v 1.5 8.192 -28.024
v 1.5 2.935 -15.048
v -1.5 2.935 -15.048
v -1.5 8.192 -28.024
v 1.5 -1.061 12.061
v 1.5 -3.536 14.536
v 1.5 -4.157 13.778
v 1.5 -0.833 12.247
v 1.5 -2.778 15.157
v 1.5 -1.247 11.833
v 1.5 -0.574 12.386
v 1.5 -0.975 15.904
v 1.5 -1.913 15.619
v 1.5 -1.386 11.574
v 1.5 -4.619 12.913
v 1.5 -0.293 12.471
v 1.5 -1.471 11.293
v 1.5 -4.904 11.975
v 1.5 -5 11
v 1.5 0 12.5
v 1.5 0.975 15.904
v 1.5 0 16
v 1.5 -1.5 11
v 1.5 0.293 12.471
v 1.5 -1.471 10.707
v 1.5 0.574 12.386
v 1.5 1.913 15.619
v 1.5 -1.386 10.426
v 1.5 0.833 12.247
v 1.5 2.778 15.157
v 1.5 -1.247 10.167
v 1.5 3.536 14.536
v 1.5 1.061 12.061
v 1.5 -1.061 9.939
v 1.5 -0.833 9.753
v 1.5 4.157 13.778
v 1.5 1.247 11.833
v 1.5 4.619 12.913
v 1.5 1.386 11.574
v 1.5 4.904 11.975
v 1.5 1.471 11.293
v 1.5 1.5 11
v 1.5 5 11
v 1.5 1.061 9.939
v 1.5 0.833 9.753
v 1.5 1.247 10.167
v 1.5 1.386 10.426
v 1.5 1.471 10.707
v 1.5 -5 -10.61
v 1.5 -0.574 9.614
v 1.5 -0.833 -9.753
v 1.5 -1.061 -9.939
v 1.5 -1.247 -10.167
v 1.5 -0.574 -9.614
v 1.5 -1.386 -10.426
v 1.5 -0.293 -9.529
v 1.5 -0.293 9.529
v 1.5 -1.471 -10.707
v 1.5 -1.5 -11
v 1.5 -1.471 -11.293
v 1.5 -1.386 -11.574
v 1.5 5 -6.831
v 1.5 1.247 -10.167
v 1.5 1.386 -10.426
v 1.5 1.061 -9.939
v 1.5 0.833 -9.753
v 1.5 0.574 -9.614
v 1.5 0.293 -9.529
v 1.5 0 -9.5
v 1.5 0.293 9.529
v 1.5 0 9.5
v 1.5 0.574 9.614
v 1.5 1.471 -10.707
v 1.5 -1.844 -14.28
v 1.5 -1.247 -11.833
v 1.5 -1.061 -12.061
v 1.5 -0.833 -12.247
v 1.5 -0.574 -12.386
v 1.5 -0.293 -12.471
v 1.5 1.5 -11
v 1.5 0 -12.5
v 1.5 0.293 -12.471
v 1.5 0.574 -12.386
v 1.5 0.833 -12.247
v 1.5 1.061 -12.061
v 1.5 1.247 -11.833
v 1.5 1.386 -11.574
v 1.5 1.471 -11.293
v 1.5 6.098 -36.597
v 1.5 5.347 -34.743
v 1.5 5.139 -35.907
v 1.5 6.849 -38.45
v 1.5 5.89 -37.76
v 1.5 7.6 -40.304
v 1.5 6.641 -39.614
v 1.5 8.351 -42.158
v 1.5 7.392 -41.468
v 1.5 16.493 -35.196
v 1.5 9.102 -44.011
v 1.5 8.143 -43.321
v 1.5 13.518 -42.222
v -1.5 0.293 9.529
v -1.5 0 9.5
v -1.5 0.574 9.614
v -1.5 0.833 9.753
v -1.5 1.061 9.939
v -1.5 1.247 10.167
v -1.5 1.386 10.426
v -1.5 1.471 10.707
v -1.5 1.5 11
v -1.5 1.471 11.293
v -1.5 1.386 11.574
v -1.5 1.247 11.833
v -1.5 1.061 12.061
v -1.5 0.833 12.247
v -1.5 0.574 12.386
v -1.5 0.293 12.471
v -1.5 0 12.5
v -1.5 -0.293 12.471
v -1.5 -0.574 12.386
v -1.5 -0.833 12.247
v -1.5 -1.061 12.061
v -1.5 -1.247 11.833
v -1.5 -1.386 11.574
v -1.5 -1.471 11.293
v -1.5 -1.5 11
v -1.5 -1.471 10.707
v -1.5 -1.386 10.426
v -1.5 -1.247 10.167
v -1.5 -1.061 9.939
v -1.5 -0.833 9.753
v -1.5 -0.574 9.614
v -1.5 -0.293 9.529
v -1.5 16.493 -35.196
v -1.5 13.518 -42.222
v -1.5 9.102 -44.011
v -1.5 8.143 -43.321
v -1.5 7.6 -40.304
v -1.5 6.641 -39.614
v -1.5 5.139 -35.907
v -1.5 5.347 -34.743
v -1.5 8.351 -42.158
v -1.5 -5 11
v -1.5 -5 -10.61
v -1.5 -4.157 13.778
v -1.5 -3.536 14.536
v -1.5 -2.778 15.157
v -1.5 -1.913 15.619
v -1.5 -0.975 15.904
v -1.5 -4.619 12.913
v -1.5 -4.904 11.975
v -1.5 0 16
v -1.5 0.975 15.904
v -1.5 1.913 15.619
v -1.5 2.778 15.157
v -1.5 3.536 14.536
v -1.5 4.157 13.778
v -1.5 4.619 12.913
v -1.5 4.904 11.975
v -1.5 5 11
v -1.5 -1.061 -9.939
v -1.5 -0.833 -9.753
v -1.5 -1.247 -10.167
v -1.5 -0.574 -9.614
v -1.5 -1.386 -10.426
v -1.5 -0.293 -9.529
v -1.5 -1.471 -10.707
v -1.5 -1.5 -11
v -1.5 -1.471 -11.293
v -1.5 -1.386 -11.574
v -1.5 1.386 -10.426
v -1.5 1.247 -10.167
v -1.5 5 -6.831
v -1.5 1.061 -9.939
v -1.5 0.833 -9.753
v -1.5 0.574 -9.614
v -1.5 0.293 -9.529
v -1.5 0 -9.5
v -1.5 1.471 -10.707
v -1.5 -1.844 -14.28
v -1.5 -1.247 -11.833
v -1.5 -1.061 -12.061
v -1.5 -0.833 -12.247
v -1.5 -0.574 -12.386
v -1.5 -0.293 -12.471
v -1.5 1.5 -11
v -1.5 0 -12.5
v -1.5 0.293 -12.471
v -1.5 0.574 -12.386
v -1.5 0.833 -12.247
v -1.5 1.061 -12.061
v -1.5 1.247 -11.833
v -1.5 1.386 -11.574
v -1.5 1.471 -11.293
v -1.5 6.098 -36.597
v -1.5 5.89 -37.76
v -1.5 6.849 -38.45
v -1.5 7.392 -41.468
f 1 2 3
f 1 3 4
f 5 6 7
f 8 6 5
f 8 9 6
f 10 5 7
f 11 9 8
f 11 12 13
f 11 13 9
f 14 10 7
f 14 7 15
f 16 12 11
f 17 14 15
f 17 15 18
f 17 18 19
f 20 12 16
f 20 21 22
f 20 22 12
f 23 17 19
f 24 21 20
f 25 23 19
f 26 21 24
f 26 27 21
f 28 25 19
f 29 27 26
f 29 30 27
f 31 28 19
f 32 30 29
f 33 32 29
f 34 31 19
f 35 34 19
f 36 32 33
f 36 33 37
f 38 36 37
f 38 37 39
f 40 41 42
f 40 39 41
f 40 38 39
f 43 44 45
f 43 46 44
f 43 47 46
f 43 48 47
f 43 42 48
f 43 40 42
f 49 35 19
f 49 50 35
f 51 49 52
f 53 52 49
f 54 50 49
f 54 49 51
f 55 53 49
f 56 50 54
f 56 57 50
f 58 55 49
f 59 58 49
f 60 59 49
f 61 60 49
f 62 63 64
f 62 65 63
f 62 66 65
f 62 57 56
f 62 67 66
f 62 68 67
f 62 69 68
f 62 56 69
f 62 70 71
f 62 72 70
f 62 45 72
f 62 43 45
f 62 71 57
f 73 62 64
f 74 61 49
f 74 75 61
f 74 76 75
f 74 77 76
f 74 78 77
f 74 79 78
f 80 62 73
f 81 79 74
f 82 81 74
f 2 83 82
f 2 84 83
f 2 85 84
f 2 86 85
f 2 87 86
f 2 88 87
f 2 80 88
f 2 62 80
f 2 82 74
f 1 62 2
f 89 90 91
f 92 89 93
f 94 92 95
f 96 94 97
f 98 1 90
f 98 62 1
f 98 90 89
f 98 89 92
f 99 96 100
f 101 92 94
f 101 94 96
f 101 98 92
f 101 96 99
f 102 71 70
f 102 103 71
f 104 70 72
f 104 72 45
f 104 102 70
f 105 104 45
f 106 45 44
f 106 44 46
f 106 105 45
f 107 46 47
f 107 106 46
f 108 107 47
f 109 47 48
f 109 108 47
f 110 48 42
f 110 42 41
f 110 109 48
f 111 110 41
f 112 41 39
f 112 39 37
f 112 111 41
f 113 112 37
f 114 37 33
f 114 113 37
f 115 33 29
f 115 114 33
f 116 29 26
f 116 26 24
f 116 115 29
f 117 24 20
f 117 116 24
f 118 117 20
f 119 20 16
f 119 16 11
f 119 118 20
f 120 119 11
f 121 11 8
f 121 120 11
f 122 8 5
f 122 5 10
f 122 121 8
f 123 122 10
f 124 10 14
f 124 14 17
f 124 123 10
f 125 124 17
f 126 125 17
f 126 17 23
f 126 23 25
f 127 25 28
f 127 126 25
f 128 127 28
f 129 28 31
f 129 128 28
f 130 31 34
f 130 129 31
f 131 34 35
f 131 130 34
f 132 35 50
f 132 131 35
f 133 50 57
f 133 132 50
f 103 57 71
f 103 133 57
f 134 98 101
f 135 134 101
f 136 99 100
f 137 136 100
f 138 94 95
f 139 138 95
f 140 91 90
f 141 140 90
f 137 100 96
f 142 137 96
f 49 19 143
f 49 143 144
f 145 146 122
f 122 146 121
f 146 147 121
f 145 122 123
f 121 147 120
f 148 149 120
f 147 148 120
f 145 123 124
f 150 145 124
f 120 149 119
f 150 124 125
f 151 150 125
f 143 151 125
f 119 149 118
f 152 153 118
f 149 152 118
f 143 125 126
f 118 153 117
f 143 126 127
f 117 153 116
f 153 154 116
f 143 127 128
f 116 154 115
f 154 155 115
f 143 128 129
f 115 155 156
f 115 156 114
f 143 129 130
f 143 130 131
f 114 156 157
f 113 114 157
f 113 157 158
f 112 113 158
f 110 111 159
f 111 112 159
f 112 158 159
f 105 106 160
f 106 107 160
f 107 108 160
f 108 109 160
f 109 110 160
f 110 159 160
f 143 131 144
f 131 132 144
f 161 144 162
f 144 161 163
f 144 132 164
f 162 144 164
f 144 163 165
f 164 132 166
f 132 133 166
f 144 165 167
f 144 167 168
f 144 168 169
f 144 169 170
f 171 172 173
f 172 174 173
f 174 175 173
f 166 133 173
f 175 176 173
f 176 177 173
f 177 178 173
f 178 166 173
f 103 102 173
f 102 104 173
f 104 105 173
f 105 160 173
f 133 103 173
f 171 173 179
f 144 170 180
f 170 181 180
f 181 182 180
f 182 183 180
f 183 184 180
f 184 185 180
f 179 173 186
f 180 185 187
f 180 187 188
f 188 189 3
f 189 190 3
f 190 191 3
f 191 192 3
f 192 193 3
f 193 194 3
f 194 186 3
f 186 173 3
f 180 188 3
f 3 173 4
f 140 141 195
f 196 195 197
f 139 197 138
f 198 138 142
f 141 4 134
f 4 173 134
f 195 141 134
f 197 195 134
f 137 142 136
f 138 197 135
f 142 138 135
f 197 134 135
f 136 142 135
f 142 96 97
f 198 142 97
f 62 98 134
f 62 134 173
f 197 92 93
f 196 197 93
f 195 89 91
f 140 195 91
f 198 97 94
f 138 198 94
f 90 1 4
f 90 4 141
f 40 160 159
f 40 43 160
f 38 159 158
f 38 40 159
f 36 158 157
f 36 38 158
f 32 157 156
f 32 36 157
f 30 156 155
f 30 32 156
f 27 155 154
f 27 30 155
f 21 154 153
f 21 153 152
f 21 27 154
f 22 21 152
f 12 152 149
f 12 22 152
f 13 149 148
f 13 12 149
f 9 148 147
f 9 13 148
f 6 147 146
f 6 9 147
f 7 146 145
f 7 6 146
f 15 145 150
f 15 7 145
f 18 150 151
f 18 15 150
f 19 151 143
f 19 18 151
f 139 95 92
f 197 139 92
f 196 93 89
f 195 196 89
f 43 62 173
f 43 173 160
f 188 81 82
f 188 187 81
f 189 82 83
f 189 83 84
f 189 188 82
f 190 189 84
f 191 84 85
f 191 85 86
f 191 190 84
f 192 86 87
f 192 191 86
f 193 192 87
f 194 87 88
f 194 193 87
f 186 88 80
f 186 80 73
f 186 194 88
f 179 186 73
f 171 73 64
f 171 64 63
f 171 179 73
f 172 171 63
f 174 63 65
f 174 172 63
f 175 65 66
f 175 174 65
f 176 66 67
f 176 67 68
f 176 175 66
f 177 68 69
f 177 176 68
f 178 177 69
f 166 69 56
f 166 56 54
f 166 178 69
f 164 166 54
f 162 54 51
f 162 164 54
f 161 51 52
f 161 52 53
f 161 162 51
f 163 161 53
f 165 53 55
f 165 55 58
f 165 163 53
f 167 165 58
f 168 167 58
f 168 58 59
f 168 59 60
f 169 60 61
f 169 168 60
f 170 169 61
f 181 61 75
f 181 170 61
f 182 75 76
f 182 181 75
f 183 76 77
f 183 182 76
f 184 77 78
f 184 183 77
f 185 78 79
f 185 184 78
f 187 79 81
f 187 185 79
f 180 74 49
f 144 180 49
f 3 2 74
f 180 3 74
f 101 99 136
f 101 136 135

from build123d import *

# Parameters (mm, degrees)
SKETCH1_R           = 5
SKETCH1_R_2         = 1.5
BOSS_EXTRUDE1_DEPTH = 1.5
BOSS_EXTRUDE2_DEPTH = 3
CUT_EXTRUDE1_DEPTH  = 3
CUT_EXTRUDE2_DEPTH  = 3


with BuildPart() as part:
    # Sketch1 → Boss-Extrude1 (new body, symmetric)
    with BuildSketch(Plane(origin=(0, 0, 0), x_dir=(0, 0, -1), z_dir=(1, 0, 0))):
        with BuildLine():
            ThreePointArc((-6, 0), (-7.464466094, -3.535533906), (-11, -5))
            Line((-11, -5), (11, -5))
            ThreePointArc((11, -5), (6, 0), (11, 5))
            Line((11, 5), (-11, 5))
            ThreePointArc((-11, 5), (-7.464466094, 3.535533906), (-6, 0))
        make_face()
        with Locations((-11, 0)):
            Circle(SKETCH1_R)
        with Locations((-11, 0)):
            Circle(SKETCH1_R_2, mode=Mode.SUBTRACT)
        with Locations((11, 0)):
            Circle(SKETCH1_R)
        with Locations((11, 0)):
            Circle(SKETCH1_R_2, mode=Mode.SUBTRACT)
    extrude(amount=BOSS_EXTRUDE1_DEPTH, both=True)

    # Sketch2 → Boss-Extrude2 (add)
    with BuildSketch(Plane(origin=(1.5, 0, 0), x_dir=(0, 0, -1), z_dir=(1, 0, 0))):
        with BuildLine():
            Line((34.743210425, 5.347223248), (34.979783381, 4.763328363))
            Line((34.979783381, 4.763328363), (44.247956153, 8.518454657))
            Line((44.247956153, 8.518454657), (40.196320101, 18.518454657))
            Line((40.196320101, 18.518454657), (6.830898124, 5))
            Line((6.830898124, 5), (11, 5))
            ThreePointArc((11, 5), (13.272352736, 4.453808824), (15.048249866, 2.934565218))
            Line((15.048249866, 2.934565218), (28.023691746, 8.191742029))
            Line((28.023691746, 8.191742029), (34.743210425, 5.347223248))
        make_face()
    extrude(amount=-BOSS_EXTRUDE2_DEPTH)

    # Sketch3 → Cut-Extrude1 (cut)
    with BuildSketch(Plane(origin=(1.5, 0, 0), x_dir=(0, 0, -1), z_dir=(1, 0, 0))):
        Polygon((40.196320101, 18.518454657), (35.196320101, 16.492636631), (42.222138127, 13.518454657), align=None)
    extrude(amount=-CUT_EXTRUDE1_DEPTH, mode=Mode.SUBTRACT)

    # Sketch4 → Cut-Extrude2 (cut)
    with BuildSketch(Plane(origin=(1.5, 0, 0), x_dir=(0, 0, -1), z_dir=(1, 0, 0))):
        Polygon((36.596844979, 6.098248507), (35.906600658, 5.138840993), (37.760235213, 5.889866252), align=None)
        Polygon((35.906600658, 5.138840993), (34.743210425, 5.347223248), (34.979783381, 4.763328363), align=None)
        Polygon((38.450479533, 6.849273765), (37.760235213, 5.889866252), (39.613869767, 6.64089151), align=None)
        Polygon((40.304114087, 7.600299024), (39.613869767, 6.64089151), (41.467504321, 7.391916769), align=None)
        Polygon((42.157748642, 8.351324283), (41.467504321, 7.391916769), (43.321138875, 8.142942028), align=None)
        Polygon((44.011383196, 9.102349542), (43.321138875, 8.142942028), (44.247956153, 8.518454657), align=None)
        with BuildLine():
            ThreePointArc((11, -5), (15.453808824, -2.272352736), (15.048249866, 2.934565218))
            Line((15.048249866, 2.934565218), (14.279867332, -1.844052603))
            Line((14.279867332, -1.844052603), (10.610317492, -5))
            Line((10.610317492, -5), (11, -5))
        make_face()
    extrude(amount=-CUT_EXTRUDE2_DEPTH, mode=Mode.SUBTRACT)


solid = part.part
